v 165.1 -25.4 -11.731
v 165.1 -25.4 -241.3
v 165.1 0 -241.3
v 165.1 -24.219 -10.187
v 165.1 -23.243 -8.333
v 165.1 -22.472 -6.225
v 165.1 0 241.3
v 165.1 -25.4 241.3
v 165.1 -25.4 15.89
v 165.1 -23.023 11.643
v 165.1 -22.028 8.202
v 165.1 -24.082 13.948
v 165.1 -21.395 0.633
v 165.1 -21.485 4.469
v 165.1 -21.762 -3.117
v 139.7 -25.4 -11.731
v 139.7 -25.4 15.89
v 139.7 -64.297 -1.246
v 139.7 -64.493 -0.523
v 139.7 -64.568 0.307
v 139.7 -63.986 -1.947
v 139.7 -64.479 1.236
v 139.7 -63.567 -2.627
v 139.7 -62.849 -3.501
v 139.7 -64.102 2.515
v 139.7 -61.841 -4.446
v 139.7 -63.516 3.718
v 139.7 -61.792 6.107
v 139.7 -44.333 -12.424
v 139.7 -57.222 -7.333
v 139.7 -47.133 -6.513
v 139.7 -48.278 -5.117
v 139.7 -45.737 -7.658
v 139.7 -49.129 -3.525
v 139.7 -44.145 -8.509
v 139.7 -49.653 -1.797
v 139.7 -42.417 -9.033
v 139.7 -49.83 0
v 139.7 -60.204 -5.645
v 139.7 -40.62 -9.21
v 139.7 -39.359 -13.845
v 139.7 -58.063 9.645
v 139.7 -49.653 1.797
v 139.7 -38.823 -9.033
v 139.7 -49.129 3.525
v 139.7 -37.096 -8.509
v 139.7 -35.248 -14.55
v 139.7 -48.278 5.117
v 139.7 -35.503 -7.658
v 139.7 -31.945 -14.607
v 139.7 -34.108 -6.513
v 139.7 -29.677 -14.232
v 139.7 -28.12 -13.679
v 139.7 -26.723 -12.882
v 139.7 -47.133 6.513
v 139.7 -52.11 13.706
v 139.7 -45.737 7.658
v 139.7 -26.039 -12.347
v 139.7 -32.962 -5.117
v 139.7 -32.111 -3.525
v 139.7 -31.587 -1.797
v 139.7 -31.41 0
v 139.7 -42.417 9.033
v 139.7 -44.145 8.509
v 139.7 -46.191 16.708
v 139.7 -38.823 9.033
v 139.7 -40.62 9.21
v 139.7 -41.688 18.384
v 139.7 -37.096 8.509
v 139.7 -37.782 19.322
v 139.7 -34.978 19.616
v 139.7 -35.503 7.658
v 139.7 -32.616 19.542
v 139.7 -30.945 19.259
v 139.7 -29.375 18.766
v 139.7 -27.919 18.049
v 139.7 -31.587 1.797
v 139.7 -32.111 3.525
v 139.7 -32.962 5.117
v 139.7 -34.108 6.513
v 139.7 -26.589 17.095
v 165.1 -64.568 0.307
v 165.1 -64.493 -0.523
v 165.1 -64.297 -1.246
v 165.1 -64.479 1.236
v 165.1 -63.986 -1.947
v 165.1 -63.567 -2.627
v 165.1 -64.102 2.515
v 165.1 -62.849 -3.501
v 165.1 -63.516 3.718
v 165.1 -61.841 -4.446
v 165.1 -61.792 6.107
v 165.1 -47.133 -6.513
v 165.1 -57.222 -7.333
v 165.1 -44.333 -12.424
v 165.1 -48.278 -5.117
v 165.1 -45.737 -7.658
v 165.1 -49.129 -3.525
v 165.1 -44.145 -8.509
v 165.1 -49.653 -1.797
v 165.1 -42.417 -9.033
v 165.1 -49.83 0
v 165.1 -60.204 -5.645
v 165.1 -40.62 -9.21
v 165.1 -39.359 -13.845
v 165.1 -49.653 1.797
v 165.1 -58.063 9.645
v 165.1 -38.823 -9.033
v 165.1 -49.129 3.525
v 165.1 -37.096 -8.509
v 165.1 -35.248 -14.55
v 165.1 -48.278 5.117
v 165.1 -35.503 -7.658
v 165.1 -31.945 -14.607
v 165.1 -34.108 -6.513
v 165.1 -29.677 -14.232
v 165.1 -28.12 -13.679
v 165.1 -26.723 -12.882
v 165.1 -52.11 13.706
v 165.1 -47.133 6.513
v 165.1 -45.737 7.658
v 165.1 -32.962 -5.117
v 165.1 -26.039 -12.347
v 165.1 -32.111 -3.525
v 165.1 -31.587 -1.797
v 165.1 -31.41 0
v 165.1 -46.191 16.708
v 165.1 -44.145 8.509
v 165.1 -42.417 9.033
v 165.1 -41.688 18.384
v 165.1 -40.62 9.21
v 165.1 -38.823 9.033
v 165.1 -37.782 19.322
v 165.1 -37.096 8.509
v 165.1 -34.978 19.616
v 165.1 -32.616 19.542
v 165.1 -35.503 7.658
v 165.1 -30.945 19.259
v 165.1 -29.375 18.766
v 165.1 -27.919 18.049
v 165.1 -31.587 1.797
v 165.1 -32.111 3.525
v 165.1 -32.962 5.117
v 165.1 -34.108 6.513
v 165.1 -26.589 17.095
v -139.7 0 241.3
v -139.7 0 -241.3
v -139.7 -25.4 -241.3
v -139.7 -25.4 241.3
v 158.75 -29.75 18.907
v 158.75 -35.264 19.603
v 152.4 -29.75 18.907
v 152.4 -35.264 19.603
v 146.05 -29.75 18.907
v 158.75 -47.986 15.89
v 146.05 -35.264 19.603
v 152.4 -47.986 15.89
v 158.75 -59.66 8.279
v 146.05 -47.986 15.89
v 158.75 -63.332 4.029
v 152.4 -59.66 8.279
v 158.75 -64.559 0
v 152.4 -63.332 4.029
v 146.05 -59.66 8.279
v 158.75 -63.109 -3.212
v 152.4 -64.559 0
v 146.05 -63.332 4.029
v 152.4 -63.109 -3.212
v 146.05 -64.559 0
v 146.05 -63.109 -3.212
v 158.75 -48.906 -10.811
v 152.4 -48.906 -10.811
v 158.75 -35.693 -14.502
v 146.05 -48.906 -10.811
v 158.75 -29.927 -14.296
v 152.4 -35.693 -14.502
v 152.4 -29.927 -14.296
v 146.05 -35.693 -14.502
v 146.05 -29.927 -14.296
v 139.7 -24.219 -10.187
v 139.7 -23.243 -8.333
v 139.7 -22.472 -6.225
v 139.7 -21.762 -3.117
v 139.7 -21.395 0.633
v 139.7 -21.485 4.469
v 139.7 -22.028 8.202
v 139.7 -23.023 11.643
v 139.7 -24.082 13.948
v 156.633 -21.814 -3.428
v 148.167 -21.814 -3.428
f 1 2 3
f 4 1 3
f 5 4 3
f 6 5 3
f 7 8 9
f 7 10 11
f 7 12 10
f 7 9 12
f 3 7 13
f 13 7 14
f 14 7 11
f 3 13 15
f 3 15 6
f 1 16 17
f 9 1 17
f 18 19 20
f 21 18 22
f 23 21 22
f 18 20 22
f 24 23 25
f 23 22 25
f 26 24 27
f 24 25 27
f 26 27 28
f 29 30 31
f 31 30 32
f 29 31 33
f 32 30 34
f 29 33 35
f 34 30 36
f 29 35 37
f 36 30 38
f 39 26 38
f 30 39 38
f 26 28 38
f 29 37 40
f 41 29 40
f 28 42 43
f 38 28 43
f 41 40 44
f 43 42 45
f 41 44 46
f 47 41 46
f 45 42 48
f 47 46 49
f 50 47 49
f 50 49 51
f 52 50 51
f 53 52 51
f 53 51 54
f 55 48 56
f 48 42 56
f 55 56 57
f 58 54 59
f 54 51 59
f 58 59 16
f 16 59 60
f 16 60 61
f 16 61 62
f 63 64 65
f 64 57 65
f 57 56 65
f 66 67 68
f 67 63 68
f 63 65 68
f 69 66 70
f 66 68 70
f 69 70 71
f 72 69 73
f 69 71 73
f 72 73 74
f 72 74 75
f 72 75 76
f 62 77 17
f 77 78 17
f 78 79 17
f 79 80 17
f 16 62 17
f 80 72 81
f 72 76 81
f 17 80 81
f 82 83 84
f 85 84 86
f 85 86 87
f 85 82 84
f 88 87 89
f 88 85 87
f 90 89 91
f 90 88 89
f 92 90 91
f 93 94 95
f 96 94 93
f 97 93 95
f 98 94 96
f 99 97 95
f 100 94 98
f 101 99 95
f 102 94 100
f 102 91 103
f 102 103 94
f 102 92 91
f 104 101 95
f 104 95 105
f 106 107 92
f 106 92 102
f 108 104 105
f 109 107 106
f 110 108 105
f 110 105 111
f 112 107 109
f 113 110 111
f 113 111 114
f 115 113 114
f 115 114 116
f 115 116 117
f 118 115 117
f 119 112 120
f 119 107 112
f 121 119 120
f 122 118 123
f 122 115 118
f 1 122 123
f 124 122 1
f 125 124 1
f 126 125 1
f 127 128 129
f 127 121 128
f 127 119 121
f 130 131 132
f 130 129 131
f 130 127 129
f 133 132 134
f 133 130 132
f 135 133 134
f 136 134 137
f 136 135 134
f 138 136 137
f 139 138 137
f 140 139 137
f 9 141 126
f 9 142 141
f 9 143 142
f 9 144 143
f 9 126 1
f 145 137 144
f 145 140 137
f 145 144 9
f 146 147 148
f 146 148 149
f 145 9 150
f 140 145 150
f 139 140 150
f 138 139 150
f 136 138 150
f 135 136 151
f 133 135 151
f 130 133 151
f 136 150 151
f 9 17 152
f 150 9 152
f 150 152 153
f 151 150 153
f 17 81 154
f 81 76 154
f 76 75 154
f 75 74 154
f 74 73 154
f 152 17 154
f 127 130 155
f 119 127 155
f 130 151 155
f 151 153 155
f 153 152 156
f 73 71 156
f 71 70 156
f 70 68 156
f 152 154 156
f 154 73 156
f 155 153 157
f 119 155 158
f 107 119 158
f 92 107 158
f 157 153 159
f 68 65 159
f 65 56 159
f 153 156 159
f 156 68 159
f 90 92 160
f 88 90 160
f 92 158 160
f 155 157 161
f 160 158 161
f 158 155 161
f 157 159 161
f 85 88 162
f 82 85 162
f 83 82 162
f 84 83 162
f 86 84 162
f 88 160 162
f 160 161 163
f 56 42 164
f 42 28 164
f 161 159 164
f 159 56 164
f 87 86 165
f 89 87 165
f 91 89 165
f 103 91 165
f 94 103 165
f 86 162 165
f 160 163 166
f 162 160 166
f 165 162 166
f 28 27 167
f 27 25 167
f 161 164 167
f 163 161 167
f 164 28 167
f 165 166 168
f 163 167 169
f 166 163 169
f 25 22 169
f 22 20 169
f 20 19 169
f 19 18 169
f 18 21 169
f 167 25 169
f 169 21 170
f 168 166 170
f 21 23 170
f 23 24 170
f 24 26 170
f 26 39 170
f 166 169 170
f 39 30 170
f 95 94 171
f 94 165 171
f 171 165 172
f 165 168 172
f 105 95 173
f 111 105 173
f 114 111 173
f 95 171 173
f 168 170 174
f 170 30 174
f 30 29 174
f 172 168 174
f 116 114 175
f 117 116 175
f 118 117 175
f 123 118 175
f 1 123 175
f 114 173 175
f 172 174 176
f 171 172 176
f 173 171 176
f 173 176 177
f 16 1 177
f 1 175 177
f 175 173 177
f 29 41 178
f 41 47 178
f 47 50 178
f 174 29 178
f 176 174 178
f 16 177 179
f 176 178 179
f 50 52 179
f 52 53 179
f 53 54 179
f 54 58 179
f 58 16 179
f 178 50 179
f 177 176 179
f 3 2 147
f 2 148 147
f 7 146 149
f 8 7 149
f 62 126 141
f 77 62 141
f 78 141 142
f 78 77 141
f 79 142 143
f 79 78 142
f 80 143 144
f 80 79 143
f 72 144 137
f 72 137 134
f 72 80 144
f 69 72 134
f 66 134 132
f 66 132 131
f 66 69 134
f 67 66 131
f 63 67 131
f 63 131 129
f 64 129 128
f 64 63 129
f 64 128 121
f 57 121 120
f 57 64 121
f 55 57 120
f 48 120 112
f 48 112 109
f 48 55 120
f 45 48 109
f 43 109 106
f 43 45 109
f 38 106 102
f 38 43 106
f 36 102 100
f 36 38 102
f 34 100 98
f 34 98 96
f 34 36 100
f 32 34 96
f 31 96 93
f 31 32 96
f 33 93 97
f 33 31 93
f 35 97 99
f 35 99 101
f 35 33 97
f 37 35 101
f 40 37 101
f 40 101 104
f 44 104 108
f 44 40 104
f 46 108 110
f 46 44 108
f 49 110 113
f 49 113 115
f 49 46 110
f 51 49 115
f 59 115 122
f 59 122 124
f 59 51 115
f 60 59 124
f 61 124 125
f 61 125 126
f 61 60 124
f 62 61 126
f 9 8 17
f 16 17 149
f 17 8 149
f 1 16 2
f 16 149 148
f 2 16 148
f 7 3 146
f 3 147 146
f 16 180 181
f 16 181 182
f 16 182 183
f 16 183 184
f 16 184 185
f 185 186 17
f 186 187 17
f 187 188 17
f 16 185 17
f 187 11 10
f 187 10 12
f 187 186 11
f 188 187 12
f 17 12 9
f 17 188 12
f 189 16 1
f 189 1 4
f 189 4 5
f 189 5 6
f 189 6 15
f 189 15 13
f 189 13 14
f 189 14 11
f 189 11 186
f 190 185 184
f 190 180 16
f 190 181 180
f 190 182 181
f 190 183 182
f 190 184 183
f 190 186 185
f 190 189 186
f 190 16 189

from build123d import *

# Parameters (mm, degrees)
F0_W     = 279.4
F0_H     = 482.6
F1_DEPTH = 25.4
F2_R     = 9.2101636832
F3_DEPTH = 25.4


with BuildPart() as f1:
    # F0 (on Front) → F1 (new body)
    with BuildSketch(Plane.XZ):
        Rectangle(F0_W, F0_H)
    extrude(amount=F1_DEPTH)

    # F2 (on face) → F3 (join)
    with BuildSketch(Plane.YZ.offset(139.7)):
        with BuildLine():
            Line((-25.4, -11.7313759401), (-25.4, 15.8898923546))
            add(Edge.make_bspline(
                [(-25.4, 15.8898923546), (-30.2232915007, 21.6659738224), (-48.5578217968, 18.3532526749), (-72.3516137088, -1.0281140256), (-48.6982925667, -11.4593535624), (-30.3847897858, -17.051569857), (-25.4, -11.7313759401)],
                knots=[0, 0, 0, 0, 0.1979250123, 0.3974815266, 0.5791241072, 0.7811204339, 0.7811204339, 0.7811204339, 0.7811204339], degree=3))
        make_face()
        with Locations((-40.6200774014, 0)):
            Circle(F2_R, mode=Mode.SUBTRACT)
        with BuildLine():
            Line((-25.4, 241.3), (-25.4, 15.8898923546))
            add(Edge.make_bspline(
                [(-25.4, -11.7313759401), (-19.9985719489, -5.9665100391), (-20.0660609566, 9.5022903499), (-25.4, 15.8898923546)],
                knots=[0.7811204339, 0.7811204339, 0.7811204339, 0.7811204339, 1, 1, 1, 1], degree=3))
            Line((-25.4, -11.7313759401), (-25.4, -241.3))
            Line((-25.4, -241.3), (0, -241.3))
            Line((0, -241.3), (0, 241.3))
            Line((0, 241.3), (-25.4, 241.3))
        make_face()
    extrude(amount=F3_DEPTH)


solid = f1.part
